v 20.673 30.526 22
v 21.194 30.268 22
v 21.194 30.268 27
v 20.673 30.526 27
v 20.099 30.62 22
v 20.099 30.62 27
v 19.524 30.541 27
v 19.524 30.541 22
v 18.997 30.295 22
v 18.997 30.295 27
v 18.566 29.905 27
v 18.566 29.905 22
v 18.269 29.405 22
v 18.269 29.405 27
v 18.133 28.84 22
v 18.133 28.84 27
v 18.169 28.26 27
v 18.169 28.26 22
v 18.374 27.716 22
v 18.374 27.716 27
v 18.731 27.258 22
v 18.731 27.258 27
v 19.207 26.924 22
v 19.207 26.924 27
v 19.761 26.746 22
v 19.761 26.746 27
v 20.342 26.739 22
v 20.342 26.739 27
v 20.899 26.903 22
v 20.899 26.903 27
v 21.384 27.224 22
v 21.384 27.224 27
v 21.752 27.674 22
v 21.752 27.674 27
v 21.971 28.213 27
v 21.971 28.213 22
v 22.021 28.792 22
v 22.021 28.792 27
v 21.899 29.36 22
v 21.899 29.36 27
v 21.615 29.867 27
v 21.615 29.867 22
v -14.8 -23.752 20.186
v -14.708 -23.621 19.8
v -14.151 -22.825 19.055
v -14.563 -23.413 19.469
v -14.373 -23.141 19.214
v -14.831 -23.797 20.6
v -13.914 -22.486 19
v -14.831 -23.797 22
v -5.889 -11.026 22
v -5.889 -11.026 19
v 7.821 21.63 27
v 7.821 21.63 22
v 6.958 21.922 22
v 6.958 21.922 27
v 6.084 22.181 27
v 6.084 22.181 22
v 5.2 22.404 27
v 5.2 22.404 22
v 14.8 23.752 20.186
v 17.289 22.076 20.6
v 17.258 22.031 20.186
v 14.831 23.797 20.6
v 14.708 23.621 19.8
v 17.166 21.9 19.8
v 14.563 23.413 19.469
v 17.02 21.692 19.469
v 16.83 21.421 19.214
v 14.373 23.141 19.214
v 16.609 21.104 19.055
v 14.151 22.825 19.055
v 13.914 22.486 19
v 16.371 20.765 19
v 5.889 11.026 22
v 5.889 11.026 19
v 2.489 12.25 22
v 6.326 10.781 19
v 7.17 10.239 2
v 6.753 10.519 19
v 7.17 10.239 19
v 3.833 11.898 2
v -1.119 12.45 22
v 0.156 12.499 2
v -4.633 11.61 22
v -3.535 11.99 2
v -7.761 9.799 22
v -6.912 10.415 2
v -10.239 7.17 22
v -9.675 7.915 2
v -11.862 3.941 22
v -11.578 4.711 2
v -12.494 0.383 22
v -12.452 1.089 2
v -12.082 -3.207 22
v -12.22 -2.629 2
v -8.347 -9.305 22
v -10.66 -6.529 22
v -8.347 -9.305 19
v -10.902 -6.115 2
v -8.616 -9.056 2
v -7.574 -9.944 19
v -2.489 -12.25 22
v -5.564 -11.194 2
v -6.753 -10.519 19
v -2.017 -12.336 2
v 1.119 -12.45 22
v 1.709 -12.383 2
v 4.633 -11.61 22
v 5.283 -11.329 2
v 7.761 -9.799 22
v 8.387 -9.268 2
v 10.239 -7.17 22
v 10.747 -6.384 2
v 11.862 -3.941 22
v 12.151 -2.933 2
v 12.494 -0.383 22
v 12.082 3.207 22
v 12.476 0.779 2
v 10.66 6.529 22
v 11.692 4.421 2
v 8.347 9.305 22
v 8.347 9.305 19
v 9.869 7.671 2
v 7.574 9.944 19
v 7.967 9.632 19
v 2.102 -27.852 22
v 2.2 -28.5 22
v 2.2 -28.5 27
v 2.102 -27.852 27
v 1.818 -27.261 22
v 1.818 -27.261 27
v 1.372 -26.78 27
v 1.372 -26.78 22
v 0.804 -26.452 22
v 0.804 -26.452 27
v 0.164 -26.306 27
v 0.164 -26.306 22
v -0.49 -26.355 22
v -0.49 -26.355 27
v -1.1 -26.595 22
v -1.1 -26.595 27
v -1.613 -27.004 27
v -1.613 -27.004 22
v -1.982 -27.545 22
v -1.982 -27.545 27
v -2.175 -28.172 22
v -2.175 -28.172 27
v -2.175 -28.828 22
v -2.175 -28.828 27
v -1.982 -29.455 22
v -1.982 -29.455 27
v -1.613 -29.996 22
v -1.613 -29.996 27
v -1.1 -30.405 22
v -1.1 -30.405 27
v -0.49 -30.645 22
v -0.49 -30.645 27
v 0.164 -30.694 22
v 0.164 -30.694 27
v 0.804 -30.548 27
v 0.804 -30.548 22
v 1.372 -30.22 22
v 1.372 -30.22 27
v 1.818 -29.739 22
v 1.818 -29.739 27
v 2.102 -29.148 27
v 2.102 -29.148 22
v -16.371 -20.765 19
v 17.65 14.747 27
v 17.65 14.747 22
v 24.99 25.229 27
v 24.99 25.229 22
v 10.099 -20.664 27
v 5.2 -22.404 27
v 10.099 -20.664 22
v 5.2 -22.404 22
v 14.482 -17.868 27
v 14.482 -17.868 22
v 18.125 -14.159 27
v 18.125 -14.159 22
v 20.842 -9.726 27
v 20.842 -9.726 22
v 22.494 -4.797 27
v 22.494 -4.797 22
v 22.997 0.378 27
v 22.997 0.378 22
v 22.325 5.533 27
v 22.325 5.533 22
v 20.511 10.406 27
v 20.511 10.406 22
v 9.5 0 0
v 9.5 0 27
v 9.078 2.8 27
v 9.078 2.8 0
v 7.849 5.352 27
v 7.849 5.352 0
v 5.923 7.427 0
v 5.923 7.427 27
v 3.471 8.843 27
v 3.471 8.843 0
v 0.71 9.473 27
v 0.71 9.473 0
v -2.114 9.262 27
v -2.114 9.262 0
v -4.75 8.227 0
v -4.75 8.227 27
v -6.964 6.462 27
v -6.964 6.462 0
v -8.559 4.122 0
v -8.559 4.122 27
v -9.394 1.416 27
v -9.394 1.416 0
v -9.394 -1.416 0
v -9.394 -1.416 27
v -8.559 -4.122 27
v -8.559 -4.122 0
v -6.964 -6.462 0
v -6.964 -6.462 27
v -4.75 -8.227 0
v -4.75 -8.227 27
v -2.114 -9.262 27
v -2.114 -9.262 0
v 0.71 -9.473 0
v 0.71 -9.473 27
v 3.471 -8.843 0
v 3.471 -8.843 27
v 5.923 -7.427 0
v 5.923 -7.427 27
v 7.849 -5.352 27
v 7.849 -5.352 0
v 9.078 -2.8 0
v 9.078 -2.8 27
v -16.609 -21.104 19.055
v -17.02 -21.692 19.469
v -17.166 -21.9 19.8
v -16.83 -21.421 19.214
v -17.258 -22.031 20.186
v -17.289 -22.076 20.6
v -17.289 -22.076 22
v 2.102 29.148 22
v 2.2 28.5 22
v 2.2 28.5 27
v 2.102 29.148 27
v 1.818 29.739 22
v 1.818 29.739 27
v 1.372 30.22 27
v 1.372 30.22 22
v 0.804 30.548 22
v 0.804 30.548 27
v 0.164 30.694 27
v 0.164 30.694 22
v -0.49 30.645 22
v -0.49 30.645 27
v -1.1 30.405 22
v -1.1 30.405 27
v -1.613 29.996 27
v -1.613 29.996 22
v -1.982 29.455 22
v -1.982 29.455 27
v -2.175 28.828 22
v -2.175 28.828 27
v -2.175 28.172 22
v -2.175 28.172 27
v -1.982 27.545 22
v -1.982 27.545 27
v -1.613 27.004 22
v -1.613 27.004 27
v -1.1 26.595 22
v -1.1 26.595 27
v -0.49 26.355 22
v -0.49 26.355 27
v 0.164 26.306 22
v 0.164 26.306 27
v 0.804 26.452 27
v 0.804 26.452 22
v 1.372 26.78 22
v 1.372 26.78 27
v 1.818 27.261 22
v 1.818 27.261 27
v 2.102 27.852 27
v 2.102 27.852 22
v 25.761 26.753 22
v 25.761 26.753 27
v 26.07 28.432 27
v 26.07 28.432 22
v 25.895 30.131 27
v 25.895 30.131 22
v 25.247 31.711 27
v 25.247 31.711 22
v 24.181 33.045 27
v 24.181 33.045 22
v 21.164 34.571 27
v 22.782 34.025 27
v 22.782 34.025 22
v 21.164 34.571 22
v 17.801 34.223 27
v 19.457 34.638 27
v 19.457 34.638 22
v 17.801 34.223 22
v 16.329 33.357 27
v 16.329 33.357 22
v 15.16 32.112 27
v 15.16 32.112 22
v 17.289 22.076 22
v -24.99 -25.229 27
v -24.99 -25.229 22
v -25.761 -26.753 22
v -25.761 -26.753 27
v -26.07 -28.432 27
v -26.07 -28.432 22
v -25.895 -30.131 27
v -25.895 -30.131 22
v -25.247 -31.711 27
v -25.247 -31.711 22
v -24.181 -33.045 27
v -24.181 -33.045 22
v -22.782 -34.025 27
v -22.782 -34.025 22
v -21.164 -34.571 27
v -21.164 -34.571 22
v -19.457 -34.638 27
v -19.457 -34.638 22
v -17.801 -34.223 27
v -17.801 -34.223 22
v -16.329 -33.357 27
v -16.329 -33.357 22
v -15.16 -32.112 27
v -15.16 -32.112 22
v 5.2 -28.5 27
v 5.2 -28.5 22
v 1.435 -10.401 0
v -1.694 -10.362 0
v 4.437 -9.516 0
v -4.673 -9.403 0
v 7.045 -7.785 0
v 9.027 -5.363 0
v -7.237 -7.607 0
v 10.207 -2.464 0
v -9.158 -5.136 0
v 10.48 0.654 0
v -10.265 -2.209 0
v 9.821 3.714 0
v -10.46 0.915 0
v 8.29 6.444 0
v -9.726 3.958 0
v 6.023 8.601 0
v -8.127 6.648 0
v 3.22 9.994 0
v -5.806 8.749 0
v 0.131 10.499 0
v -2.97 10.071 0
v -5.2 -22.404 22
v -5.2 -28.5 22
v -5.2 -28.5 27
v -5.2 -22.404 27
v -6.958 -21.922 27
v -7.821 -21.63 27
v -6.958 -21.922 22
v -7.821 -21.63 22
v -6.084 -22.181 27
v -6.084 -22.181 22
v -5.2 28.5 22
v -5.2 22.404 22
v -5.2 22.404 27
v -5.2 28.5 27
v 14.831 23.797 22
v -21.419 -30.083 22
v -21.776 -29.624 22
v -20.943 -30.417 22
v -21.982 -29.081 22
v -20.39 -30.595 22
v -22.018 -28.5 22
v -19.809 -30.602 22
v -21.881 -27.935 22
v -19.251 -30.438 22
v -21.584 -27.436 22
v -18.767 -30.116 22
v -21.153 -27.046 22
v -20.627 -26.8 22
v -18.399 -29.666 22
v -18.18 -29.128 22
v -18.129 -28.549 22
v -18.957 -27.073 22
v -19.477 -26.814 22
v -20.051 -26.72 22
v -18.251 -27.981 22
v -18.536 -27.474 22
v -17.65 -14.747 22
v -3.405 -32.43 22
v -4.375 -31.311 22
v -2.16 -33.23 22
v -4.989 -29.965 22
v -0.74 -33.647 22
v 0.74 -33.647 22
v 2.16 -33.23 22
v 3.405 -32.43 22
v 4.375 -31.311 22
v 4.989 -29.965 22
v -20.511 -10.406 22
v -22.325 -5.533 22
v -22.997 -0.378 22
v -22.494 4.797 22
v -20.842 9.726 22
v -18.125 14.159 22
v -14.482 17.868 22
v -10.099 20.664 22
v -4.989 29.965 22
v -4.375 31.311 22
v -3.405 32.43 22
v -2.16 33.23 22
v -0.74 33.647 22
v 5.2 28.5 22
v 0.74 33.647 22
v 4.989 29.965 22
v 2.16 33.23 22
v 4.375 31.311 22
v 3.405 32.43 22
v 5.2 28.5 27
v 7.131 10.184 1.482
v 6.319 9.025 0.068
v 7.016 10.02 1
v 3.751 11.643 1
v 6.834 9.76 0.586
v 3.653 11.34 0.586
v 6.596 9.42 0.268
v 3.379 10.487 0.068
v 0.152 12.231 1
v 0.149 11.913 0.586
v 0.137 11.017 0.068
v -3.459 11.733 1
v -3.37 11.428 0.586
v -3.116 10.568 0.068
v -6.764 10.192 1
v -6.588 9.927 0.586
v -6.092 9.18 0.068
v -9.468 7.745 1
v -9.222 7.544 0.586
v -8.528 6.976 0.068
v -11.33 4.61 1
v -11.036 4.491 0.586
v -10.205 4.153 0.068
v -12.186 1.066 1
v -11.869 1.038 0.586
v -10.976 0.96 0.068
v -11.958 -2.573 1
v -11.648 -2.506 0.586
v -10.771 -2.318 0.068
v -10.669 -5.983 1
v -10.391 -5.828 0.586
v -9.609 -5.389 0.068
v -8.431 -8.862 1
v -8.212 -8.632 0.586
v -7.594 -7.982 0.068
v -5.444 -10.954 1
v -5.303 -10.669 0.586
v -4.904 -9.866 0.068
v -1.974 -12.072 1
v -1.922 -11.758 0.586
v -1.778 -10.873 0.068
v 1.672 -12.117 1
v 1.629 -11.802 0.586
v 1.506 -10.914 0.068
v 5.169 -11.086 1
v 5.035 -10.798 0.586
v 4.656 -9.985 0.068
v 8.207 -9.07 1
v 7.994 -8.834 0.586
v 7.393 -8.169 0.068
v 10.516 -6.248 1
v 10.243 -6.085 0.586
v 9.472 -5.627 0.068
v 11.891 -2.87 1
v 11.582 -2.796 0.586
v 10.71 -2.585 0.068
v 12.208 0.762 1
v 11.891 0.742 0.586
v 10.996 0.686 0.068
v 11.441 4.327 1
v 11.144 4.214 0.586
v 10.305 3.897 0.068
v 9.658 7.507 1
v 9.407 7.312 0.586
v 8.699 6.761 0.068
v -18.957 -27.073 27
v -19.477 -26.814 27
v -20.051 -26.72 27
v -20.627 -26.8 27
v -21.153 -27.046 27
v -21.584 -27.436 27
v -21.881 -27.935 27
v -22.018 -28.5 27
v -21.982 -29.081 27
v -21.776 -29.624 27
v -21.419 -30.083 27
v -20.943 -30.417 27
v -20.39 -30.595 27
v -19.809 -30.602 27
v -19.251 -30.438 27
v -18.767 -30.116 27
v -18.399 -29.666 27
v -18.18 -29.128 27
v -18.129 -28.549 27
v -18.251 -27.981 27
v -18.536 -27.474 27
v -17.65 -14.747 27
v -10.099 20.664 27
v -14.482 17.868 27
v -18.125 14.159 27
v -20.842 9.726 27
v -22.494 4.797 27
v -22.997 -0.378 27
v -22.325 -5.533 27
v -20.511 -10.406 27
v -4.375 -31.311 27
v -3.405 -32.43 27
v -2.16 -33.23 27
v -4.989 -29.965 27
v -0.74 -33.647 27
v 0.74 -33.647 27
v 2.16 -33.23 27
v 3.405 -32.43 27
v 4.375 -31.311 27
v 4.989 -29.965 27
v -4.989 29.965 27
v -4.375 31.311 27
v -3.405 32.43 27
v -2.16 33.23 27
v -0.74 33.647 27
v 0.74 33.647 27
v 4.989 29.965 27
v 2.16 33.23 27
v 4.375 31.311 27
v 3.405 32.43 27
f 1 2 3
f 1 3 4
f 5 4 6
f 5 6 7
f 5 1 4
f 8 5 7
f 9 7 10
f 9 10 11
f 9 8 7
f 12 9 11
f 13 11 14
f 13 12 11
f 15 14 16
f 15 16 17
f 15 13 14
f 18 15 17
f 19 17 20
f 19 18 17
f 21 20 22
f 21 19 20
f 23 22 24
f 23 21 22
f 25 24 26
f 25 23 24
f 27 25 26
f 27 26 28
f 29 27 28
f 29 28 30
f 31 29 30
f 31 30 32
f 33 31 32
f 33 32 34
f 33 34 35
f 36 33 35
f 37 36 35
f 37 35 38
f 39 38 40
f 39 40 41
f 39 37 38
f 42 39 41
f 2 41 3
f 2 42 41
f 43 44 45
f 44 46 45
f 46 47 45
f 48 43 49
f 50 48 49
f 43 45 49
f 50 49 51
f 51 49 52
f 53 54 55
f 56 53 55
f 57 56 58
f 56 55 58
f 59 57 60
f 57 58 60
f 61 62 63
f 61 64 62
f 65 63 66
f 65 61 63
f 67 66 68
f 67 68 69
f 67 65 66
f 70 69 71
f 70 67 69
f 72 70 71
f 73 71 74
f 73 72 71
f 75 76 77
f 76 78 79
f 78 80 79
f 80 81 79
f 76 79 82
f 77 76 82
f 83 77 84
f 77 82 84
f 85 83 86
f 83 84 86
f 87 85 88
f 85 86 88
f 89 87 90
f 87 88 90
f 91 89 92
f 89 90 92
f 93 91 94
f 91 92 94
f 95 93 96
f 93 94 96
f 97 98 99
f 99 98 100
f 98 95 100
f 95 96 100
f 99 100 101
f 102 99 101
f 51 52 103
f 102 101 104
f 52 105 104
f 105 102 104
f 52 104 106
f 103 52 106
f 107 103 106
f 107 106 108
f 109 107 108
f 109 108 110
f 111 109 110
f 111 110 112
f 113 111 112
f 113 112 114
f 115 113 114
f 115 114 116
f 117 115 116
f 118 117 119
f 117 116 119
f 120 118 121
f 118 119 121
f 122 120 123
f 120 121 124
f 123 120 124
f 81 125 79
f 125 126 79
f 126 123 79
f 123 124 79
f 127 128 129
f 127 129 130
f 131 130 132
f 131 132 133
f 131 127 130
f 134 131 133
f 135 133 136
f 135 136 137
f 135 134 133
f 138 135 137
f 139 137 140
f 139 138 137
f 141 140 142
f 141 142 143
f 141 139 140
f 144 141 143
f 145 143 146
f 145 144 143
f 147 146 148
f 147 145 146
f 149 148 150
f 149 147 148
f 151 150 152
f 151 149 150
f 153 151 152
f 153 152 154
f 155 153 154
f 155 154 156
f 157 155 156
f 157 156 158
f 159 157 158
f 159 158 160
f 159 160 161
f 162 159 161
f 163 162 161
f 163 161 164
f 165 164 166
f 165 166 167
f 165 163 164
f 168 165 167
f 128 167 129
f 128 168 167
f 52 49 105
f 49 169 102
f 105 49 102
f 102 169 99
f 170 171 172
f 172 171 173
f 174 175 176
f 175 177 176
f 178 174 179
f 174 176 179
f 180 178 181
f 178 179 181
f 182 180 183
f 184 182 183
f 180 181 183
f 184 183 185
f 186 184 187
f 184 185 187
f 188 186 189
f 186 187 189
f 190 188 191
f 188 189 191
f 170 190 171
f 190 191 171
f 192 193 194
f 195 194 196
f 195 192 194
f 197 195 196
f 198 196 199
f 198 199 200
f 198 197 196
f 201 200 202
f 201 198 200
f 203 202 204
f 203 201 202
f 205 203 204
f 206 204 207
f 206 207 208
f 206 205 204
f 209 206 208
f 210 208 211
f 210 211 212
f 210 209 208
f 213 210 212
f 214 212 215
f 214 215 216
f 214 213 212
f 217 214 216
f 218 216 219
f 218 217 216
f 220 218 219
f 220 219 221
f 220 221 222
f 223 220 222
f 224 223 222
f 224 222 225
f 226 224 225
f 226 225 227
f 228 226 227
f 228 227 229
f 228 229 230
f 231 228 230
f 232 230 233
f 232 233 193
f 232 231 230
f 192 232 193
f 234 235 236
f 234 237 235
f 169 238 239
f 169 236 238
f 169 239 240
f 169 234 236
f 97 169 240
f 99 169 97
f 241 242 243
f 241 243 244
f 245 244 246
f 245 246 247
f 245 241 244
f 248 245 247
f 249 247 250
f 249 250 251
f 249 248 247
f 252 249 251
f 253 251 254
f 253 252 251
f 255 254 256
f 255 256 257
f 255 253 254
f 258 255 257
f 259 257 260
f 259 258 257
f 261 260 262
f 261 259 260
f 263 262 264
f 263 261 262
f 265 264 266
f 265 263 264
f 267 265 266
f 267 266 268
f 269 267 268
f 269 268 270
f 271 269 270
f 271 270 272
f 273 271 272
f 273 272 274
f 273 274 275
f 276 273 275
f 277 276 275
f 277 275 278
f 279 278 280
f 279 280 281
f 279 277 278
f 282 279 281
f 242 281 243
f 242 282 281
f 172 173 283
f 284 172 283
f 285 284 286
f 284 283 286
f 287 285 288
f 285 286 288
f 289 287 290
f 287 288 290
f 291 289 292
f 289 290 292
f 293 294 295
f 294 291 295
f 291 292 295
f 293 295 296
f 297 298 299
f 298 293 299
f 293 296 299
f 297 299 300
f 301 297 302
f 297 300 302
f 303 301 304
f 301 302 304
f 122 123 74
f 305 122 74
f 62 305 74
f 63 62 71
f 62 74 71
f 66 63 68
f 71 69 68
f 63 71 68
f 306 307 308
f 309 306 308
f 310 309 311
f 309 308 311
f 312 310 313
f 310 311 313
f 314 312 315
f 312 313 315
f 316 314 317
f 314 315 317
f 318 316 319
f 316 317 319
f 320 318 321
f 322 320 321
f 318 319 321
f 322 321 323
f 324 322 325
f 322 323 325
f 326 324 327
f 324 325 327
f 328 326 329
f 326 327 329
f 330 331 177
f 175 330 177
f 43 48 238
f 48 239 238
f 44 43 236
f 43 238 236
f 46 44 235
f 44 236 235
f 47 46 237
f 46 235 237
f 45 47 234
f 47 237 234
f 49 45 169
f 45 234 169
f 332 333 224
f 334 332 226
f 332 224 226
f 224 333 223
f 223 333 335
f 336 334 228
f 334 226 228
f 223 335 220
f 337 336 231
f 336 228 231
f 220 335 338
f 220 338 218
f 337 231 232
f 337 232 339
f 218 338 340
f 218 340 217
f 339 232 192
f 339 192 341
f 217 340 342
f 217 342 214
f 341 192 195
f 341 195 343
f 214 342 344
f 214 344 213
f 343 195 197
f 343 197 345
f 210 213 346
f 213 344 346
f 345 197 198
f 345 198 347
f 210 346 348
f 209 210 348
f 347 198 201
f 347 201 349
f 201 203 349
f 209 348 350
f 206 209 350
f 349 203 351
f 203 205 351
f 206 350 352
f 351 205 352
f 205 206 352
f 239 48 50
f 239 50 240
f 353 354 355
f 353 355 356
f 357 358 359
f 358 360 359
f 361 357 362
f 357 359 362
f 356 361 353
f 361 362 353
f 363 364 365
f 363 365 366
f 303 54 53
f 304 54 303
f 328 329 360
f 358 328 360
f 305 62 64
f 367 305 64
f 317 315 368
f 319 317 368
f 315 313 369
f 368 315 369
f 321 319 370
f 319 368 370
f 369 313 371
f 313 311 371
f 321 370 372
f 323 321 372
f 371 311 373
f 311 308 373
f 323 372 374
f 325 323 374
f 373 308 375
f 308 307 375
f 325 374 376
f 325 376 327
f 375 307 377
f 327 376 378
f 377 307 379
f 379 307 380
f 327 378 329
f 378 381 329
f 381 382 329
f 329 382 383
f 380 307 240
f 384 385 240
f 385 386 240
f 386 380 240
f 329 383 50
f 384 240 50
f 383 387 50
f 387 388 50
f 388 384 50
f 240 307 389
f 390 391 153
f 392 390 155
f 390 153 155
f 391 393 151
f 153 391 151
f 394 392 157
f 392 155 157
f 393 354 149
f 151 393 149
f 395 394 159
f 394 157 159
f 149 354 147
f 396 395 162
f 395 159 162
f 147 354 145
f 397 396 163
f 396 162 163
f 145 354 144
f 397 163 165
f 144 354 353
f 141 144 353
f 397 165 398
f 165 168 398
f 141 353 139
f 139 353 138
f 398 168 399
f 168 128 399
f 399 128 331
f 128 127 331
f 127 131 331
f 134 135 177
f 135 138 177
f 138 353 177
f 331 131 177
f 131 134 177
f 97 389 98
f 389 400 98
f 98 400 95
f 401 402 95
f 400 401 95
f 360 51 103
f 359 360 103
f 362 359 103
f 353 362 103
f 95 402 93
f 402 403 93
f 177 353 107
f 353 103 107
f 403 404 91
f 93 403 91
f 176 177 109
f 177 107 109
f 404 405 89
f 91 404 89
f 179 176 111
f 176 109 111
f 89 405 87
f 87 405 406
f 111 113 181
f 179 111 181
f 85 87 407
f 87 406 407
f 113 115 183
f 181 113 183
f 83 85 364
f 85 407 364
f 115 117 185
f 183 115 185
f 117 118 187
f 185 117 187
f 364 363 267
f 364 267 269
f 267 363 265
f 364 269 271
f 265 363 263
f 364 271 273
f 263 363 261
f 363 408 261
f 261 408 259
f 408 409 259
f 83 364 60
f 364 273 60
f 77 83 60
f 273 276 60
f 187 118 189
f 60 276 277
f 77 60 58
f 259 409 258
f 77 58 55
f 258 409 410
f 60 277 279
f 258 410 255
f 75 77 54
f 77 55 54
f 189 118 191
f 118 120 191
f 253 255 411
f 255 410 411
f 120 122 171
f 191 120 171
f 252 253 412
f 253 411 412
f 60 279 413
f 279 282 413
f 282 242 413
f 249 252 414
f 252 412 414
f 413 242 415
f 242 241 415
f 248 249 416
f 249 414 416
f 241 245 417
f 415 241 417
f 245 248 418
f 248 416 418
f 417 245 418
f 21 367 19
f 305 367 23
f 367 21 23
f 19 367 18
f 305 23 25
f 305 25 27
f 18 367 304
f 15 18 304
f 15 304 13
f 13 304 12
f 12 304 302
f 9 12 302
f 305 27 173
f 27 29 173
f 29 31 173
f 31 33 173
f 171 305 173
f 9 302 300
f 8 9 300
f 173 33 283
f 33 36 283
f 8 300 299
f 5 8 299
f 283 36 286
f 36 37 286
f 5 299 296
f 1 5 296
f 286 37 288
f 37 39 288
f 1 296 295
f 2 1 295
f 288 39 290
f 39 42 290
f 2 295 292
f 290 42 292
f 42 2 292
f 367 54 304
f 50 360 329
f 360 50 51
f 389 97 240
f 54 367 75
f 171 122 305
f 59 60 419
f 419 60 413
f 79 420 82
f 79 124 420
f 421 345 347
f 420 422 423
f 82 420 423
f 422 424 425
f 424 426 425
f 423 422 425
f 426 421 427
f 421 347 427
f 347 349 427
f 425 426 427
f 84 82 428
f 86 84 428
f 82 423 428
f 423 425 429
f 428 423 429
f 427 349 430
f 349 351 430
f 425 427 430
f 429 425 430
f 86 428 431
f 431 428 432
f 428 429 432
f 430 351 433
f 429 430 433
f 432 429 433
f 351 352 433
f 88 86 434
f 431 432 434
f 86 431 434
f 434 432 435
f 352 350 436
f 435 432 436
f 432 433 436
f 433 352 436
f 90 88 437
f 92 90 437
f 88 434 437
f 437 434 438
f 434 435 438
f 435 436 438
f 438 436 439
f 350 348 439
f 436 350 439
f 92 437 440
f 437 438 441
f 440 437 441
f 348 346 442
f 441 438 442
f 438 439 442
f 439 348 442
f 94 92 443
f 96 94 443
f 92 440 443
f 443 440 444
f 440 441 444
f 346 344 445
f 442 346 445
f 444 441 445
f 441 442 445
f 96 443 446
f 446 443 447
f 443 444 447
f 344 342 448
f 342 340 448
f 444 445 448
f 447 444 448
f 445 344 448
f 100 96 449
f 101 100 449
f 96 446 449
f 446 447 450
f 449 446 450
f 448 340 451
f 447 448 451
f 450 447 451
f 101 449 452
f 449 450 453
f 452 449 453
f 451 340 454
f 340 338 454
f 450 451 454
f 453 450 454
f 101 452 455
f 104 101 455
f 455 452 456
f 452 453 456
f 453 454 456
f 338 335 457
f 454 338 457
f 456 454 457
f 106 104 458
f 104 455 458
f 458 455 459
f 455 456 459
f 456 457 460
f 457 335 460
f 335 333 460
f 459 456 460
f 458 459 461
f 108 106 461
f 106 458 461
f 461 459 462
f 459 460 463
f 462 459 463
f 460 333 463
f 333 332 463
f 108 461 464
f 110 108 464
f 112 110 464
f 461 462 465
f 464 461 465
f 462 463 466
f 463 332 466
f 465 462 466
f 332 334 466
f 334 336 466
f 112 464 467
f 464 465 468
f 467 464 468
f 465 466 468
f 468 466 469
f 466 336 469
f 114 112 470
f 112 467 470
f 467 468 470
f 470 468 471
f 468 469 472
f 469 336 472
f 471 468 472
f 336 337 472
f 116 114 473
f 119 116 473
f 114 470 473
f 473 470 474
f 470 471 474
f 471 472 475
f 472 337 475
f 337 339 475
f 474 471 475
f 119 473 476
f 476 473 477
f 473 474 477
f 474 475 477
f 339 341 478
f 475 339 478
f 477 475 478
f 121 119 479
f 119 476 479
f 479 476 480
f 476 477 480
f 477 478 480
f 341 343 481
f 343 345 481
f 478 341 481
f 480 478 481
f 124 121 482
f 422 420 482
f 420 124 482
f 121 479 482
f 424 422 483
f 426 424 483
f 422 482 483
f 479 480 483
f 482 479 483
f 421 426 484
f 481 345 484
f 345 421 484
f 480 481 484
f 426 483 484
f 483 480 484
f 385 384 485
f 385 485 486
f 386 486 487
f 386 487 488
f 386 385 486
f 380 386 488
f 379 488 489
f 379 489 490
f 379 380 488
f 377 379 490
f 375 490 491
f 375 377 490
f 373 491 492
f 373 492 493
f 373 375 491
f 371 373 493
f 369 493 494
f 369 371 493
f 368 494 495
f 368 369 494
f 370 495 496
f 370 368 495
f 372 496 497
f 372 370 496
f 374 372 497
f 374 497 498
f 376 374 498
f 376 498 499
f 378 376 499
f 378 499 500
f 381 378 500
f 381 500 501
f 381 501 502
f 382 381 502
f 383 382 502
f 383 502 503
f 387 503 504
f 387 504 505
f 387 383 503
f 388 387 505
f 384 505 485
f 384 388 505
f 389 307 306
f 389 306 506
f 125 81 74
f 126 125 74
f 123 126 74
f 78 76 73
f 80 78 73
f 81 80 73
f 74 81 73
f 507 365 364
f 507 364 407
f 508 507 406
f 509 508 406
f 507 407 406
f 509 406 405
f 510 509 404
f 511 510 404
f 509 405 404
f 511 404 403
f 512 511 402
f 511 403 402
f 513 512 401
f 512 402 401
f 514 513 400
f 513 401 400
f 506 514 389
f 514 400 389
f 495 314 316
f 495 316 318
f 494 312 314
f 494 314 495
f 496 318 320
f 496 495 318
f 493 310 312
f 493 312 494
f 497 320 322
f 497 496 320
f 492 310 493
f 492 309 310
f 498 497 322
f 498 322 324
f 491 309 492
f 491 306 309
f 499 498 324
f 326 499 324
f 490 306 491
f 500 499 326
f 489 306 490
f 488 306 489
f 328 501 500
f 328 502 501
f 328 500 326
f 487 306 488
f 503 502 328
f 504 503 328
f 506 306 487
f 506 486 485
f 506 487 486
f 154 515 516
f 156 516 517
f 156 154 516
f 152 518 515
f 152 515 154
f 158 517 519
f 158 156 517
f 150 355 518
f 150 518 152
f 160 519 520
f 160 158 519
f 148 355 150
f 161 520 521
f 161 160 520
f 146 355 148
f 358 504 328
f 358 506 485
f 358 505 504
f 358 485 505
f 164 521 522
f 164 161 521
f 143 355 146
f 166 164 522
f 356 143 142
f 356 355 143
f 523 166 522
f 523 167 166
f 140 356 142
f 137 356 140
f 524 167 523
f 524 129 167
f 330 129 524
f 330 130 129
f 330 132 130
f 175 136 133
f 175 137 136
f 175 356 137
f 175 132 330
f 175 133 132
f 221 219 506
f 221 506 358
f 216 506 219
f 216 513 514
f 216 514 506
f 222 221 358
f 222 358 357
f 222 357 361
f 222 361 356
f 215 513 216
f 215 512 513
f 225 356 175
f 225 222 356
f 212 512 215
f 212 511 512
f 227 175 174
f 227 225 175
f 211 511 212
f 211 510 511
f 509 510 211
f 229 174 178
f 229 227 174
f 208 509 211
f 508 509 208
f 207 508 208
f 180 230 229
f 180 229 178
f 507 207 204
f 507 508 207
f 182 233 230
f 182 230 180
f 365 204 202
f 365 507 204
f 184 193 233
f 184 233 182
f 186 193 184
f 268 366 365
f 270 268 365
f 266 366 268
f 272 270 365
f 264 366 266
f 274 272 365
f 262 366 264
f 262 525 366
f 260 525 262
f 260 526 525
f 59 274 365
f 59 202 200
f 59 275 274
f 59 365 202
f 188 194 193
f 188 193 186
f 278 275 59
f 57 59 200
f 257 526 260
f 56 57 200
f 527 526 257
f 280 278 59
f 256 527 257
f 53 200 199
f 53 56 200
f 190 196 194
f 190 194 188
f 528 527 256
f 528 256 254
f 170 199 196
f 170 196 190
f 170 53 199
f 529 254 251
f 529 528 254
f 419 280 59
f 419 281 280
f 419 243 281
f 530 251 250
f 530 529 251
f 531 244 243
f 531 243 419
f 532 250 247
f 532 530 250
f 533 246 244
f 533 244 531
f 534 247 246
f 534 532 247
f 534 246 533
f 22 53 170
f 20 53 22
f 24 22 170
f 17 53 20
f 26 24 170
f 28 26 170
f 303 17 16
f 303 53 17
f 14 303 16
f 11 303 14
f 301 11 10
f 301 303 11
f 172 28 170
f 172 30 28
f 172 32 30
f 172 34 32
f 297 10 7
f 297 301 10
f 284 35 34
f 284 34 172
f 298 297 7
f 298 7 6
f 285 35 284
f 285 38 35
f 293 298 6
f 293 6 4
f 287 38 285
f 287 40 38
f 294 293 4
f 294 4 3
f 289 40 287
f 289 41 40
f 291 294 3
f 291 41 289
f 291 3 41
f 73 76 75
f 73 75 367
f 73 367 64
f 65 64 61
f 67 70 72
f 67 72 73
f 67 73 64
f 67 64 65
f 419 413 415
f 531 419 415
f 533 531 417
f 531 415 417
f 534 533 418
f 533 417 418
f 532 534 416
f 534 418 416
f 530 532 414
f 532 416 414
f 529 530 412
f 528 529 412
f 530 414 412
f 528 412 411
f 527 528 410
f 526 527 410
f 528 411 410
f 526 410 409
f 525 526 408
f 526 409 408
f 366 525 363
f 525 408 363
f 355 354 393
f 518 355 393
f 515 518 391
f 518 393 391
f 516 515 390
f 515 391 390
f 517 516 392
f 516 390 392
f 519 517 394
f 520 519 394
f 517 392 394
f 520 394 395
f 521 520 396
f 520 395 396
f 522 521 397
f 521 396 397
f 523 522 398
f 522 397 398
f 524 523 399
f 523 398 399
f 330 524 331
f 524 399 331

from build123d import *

# Parameters (mm, degrees)
CYLINDER032_R                = 9.5
CYLINDER032_DEPTH            = 27
CYLINDER035_R                = 23
CYLINDER035_DEPTH            = 5
CYLINDER046_R                = 2.2
CYLINDER046_DEPTH            = 5
ARRAY022_Y_COUNT             = 2
ARRAY022_Y_PITCH             = 57
BOX_W                        = 10.4
BOX_H                        = 57
BOX_DEPTH                    = 5
CYLINDER048_R                = 5.2
CYLINDER048_DEPTH            = 5
ARRAY021_Y_COUNT             = 2
ARRAY021_Y_PITCH             = 57
CUT002004004_PLACEMENT_ANGLE = 305
BOX008_W                     = 56
BOX008_H                     = 3
BOX008_DEPTH                 = 3
FILLET004_R                  = 1.6
CYLINDER031_R                = 12.5
CYLINDER031_DEPTH            = 27
FILLET_R                     = 2
CYLINDER030_R                = 1.95
CYLINDER030_DEPTH            = 5
ARRAY015_X_COUNT             = 2
ARRAY015_X_PITCH             = 70
BOX004_W                     = 70
BOX004_H                     = 12
BOX004_DEPTH                 = 5
CYLINDER029_R                = 6
CYLINDER029_DEPTH            = 5
ARRAY014_X_COUNT             = 2
ARRAY014_X_PITCH             = 70
FUSION018_PLACEMENT_ANGLE    = 55


with BuildPart() as zero_holder_internal_cylinder:
    # Cylinder032 → Cylinder032 (new body)
    with BuildSketch(Plane.XY):
        Circle(CYLINDER032_R)
    extrude(amount=CYLINDER032_DEPTH)


with BuildPart() as zero_holder_top_disk:
    # Cylinder035 → Cylinder035 (new body)
    with BuildSketch(Plane.XY.offset(22)):
        Circle(CYLINDER035_R)
    extrude(amount=CYLINDER035_DEPTH)


with BuildPart() as extract_fusion:
    # Cylinder046 → Cylinder046 (new body)
    with BuildSketch(Plane.XY):
        Circle(CYLINDER046_R)
    extrude(amount=CYLINDER046_DEPTH)

    # Array022 Y: extract fusion ×2


with BuildPart() as extract_fusion_1:
    add(extract_fusion.part)
    with Locations(*[(0, i * ARRAY022_Y_PITCH, 0) for i in range(1, ARRAY022_Y_COUNT)]):
        add(extract_fusion.part)


with BuildPart() as extract_fusion_2:
    # Array022 placement: moved
    add(extract_fusion_1.part.moved(Location((0, -28.5, 0))))


with BuildPart() as between_hole_cube:
    # Box → Box (new body)
    with BuildSketch(Plane(origin=(-5.2, -28.5, 0), x_dir=(1, 0, 0), z_dir=(0, 0, 1))):
        with Locations((5.2, 28.5)):
            Rectangle(BOX_W, BOX_H)
    extrude(amount=BOX_DEPTH)


with BuildPart() as microscope_attachment_cut:
    # Cylinder048 → Cylinder048 (new body)
    with BuildSketch(Plane.XY):
        Circle(CYLINDER048_R)
    extrude(amount=CYLINDER048_DEPTH)

    # Array021 Y: microscope attachment cut ×2


with BuildPart() as microscope_attachment_cut_1:
    add(microscope_attachment_cut.part)
    with Locations(*[(0, i * ARRAY021_Y_PITCH, 0) for i in range(1, ARRAY021_Y_COUNT)]):
        add(microscope_attachment_cut.part)


with BuildPart() as microscope_attachment_cut_2:
    # Array021 placement: moved
    add(microscope_attachment_cut_1.part.moved(Location((0, -28.5, 0))))

    # Fusion023: union between hole cube
    add(between_hole_cube.part)

    # Cut002004004: cut extract fusion
    add(extract_fusion_2.part, mode=Mode.SUBTRACT)


with BuildPart() as microscope_attachment_cut_3:
    # Cut002004004 placement: moved
    add(microscope_attachment_cut_2.part.moved(Location((0, 0, 22))).rotate(Axis((0, 0, 22), (0, 0, 1)), CUT002004004_PLACEMENT_ANGLE))


with BuildPart() as sprint_plate_fillet:
    # Box008 → Box008 (new body)
    with BuildSketch(Plane(origin=(-28, -1.5, 19), x_dir=(1, 0, 0), z_dir=(0, 0, 1))):
        with Locations((28, 1.5)):
            Rectangle(BOX008_W, BOX008_H)
    extrude(amount=BOX008_DEPTH)

    # Fillet004
    fillet004_edges = [sprint_plate_fillet.edges().sort_by_distance(p)[0] for p in [
        (-28, 0, 19),
        (28, 0, 19),
    ]]
    fillet(fillet004_edges, radius=FILLET004_R)


with BuildPart() as zero_holder_external_cylinder_fillet:
    # Cylinder031 → Cylinder031 (new body)
    with BuildSketch(Plane.XY):
        Circle(CYLINDER031_R)
    extrude(amount=CYLINDER031_DEPTH)

    # Fillet
    fillet_edges = [zero_holder_external_cylinder_fillet.edges().sort_by_distance(p)[0] for p in [
        (-12.5, 0, 0),
    ]]
    fillet(fillet_edges, radius=FILLET_R)


with BuildPart() as spring_plate_end_array003:
    # Cylinder030 → Cylinder030 (new body)
    with BuildSketch(Plane.XY):
        Circle(CYLINDER030_R)
    extrude(amount=CYLINDER030_DEPTH)

    # Array015 X: spring plate end array003 ×2


with BuildPart() as spring_plate_end_array003_1:
    add(spring_plate_end_array003.part)
    with Locations(*[(i * ARRAY015_X_PITCH, 0, 0) for i in range(1, ARRAY015_X_COUNT)]):
        add(spring_plate_end_array003.part)


with BuildPart() as cube:
    # Box004 → Box004 (new body)
    with BuildSketch(Plane(origin=(0, -6, 0), x_dir=(1, 0, 0), z_dir=(0, 0, 1))):
        with Locations((35, 6)):
            Rectangle(BOX004_W, BOX004_H)
    extrude(amount=BOX004_DEPTH)


with BuildPart() as zero_holder_cut:
    # Cylinder029 → Cylinder029 (new body)
    with BuildSketch(Plane.XY):
        Circle(CYLINDER029_R)
    extrude(amount=CYLINDER029_DEPTH)

    # Array014 X: zero holder cut ×2


with BuildPart() as zero_holder_cut_1:
    add(zero_holder_cut.part)
    with Locations(*[(i * ARRAY014_X_PITCH, 0, 0) for i in range(1, ARRAY014_X_COUNT)]):
        add(zero_holder_cut.part)

    # Fusion017: union Cube
    add(cube.part)

    # Cut010: cut spring plate end array003
    add(spring_plate_end_array003_1.part, mode=Mode.SUBTRACT)


with BuildPart() as zero_holder_cut_2:
    # Cut010 placement: moved
    add(zero_holder_cut_1.part.moved(Location((-35, 0, 22))))

    # Fusion018: union zero holder top disk, microscope attachment cut, sprint plate fillet, zero holder external cylinder fillet
    add(zero_holder_top_disk.part)
    add(microscope_attachment_cut_3.part)
    add(sprint_plate_fillet.part)
    add(zero_holder_external_cylinder_fillet.part)


with BuildPart() as zero_holder_cut_3:
    # Fusion018 placement: moved
    add(zero_holder_cut_2.part.rotate(Axis((0, 0, 0), (0, 0, 1)), FUSION018_PLACEMENT_ANGLE))

    # Cut011: cut zero holder internal cylinder
    add(zero_holder_internal_cylinder.part, mode=Mode.SUBTRACT)


solid = zero_holder_cut_3.part
